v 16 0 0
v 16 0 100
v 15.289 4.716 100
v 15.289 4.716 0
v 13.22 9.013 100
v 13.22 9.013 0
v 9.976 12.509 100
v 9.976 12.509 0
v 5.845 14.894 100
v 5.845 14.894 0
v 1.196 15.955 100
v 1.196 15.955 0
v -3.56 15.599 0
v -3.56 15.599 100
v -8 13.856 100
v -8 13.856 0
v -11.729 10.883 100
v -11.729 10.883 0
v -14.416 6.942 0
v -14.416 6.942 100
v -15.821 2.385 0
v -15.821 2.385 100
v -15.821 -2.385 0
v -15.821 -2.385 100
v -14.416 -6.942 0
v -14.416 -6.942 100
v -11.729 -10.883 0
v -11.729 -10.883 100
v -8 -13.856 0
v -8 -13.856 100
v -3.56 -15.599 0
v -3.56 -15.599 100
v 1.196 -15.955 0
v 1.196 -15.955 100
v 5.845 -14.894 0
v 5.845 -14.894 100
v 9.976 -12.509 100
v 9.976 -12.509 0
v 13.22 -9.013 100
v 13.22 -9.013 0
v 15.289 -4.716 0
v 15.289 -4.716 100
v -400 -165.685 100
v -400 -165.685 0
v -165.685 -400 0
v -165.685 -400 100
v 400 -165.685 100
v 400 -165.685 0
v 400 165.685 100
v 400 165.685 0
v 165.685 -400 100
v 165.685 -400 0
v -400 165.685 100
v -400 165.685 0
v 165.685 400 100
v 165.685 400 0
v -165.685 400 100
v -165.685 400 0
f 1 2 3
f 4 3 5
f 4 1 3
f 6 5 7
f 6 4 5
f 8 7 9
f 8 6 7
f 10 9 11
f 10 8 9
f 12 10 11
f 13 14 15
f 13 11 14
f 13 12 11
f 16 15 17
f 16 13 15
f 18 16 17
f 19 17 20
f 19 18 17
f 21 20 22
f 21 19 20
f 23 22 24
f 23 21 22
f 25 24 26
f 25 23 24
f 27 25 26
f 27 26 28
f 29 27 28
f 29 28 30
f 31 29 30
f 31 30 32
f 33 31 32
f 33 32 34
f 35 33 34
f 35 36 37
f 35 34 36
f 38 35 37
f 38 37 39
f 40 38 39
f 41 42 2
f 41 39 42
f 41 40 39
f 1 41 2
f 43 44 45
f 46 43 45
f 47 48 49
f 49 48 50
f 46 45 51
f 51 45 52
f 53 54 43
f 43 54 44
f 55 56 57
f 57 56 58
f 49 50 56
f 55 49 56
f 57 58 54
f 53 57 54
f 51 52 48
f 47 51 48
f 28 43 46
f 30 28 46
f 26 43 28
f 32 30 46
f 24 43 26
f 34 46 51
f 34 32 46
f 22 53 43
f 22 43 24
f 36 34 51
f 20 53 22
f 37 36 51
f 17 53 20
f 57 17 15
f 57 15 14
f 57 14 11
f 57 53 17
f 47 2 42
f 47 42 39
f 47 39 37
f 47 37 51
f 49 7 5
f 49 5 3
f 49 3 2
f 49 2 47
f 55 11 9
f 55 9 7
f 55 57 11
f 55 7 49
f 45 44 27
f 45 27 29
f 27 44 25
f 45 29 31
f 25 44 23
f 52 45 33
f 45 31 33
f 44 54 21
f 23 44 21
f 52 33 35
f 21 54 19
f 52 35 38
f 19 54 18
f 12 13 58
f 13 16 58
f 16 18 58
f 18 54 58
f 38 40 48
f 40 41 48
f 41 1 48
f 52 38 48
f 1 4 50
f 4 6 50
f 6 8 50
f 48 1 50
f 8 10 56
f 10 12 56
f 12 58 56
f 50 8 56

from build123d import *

# Parameters (mm, degrees)
CYLINDER_R     = 16
CYLINDER_DEPTH = 120
PAD_DEPTH      = 100


with BuildPart() as cylinder:
    # Cylinder → Cylinder (new body)
    with BuildSketch(Plane.XY):
        Circle(CYLINDER_R)
    extrude(amount=CYLINDER_DEPTH)


with BuildPart() as cut:
    # Sketch → Pad (new body)
    with BuildSketch(Plane.XY):
        Polygon((400, -165.685425), (400, 165.685425), (165.685425, 400), (-165.685425, 400), (-400, 165.685425), (-400, -165.685425), (-165.685425, -400), (165.685425, -400), align=None)
    extrude(amount=PAD_DEPTH)

    # Cut: cut Cylinder
    add(cylinder.part, mode=Mode.SUBTRACT)


solid = cut.part
